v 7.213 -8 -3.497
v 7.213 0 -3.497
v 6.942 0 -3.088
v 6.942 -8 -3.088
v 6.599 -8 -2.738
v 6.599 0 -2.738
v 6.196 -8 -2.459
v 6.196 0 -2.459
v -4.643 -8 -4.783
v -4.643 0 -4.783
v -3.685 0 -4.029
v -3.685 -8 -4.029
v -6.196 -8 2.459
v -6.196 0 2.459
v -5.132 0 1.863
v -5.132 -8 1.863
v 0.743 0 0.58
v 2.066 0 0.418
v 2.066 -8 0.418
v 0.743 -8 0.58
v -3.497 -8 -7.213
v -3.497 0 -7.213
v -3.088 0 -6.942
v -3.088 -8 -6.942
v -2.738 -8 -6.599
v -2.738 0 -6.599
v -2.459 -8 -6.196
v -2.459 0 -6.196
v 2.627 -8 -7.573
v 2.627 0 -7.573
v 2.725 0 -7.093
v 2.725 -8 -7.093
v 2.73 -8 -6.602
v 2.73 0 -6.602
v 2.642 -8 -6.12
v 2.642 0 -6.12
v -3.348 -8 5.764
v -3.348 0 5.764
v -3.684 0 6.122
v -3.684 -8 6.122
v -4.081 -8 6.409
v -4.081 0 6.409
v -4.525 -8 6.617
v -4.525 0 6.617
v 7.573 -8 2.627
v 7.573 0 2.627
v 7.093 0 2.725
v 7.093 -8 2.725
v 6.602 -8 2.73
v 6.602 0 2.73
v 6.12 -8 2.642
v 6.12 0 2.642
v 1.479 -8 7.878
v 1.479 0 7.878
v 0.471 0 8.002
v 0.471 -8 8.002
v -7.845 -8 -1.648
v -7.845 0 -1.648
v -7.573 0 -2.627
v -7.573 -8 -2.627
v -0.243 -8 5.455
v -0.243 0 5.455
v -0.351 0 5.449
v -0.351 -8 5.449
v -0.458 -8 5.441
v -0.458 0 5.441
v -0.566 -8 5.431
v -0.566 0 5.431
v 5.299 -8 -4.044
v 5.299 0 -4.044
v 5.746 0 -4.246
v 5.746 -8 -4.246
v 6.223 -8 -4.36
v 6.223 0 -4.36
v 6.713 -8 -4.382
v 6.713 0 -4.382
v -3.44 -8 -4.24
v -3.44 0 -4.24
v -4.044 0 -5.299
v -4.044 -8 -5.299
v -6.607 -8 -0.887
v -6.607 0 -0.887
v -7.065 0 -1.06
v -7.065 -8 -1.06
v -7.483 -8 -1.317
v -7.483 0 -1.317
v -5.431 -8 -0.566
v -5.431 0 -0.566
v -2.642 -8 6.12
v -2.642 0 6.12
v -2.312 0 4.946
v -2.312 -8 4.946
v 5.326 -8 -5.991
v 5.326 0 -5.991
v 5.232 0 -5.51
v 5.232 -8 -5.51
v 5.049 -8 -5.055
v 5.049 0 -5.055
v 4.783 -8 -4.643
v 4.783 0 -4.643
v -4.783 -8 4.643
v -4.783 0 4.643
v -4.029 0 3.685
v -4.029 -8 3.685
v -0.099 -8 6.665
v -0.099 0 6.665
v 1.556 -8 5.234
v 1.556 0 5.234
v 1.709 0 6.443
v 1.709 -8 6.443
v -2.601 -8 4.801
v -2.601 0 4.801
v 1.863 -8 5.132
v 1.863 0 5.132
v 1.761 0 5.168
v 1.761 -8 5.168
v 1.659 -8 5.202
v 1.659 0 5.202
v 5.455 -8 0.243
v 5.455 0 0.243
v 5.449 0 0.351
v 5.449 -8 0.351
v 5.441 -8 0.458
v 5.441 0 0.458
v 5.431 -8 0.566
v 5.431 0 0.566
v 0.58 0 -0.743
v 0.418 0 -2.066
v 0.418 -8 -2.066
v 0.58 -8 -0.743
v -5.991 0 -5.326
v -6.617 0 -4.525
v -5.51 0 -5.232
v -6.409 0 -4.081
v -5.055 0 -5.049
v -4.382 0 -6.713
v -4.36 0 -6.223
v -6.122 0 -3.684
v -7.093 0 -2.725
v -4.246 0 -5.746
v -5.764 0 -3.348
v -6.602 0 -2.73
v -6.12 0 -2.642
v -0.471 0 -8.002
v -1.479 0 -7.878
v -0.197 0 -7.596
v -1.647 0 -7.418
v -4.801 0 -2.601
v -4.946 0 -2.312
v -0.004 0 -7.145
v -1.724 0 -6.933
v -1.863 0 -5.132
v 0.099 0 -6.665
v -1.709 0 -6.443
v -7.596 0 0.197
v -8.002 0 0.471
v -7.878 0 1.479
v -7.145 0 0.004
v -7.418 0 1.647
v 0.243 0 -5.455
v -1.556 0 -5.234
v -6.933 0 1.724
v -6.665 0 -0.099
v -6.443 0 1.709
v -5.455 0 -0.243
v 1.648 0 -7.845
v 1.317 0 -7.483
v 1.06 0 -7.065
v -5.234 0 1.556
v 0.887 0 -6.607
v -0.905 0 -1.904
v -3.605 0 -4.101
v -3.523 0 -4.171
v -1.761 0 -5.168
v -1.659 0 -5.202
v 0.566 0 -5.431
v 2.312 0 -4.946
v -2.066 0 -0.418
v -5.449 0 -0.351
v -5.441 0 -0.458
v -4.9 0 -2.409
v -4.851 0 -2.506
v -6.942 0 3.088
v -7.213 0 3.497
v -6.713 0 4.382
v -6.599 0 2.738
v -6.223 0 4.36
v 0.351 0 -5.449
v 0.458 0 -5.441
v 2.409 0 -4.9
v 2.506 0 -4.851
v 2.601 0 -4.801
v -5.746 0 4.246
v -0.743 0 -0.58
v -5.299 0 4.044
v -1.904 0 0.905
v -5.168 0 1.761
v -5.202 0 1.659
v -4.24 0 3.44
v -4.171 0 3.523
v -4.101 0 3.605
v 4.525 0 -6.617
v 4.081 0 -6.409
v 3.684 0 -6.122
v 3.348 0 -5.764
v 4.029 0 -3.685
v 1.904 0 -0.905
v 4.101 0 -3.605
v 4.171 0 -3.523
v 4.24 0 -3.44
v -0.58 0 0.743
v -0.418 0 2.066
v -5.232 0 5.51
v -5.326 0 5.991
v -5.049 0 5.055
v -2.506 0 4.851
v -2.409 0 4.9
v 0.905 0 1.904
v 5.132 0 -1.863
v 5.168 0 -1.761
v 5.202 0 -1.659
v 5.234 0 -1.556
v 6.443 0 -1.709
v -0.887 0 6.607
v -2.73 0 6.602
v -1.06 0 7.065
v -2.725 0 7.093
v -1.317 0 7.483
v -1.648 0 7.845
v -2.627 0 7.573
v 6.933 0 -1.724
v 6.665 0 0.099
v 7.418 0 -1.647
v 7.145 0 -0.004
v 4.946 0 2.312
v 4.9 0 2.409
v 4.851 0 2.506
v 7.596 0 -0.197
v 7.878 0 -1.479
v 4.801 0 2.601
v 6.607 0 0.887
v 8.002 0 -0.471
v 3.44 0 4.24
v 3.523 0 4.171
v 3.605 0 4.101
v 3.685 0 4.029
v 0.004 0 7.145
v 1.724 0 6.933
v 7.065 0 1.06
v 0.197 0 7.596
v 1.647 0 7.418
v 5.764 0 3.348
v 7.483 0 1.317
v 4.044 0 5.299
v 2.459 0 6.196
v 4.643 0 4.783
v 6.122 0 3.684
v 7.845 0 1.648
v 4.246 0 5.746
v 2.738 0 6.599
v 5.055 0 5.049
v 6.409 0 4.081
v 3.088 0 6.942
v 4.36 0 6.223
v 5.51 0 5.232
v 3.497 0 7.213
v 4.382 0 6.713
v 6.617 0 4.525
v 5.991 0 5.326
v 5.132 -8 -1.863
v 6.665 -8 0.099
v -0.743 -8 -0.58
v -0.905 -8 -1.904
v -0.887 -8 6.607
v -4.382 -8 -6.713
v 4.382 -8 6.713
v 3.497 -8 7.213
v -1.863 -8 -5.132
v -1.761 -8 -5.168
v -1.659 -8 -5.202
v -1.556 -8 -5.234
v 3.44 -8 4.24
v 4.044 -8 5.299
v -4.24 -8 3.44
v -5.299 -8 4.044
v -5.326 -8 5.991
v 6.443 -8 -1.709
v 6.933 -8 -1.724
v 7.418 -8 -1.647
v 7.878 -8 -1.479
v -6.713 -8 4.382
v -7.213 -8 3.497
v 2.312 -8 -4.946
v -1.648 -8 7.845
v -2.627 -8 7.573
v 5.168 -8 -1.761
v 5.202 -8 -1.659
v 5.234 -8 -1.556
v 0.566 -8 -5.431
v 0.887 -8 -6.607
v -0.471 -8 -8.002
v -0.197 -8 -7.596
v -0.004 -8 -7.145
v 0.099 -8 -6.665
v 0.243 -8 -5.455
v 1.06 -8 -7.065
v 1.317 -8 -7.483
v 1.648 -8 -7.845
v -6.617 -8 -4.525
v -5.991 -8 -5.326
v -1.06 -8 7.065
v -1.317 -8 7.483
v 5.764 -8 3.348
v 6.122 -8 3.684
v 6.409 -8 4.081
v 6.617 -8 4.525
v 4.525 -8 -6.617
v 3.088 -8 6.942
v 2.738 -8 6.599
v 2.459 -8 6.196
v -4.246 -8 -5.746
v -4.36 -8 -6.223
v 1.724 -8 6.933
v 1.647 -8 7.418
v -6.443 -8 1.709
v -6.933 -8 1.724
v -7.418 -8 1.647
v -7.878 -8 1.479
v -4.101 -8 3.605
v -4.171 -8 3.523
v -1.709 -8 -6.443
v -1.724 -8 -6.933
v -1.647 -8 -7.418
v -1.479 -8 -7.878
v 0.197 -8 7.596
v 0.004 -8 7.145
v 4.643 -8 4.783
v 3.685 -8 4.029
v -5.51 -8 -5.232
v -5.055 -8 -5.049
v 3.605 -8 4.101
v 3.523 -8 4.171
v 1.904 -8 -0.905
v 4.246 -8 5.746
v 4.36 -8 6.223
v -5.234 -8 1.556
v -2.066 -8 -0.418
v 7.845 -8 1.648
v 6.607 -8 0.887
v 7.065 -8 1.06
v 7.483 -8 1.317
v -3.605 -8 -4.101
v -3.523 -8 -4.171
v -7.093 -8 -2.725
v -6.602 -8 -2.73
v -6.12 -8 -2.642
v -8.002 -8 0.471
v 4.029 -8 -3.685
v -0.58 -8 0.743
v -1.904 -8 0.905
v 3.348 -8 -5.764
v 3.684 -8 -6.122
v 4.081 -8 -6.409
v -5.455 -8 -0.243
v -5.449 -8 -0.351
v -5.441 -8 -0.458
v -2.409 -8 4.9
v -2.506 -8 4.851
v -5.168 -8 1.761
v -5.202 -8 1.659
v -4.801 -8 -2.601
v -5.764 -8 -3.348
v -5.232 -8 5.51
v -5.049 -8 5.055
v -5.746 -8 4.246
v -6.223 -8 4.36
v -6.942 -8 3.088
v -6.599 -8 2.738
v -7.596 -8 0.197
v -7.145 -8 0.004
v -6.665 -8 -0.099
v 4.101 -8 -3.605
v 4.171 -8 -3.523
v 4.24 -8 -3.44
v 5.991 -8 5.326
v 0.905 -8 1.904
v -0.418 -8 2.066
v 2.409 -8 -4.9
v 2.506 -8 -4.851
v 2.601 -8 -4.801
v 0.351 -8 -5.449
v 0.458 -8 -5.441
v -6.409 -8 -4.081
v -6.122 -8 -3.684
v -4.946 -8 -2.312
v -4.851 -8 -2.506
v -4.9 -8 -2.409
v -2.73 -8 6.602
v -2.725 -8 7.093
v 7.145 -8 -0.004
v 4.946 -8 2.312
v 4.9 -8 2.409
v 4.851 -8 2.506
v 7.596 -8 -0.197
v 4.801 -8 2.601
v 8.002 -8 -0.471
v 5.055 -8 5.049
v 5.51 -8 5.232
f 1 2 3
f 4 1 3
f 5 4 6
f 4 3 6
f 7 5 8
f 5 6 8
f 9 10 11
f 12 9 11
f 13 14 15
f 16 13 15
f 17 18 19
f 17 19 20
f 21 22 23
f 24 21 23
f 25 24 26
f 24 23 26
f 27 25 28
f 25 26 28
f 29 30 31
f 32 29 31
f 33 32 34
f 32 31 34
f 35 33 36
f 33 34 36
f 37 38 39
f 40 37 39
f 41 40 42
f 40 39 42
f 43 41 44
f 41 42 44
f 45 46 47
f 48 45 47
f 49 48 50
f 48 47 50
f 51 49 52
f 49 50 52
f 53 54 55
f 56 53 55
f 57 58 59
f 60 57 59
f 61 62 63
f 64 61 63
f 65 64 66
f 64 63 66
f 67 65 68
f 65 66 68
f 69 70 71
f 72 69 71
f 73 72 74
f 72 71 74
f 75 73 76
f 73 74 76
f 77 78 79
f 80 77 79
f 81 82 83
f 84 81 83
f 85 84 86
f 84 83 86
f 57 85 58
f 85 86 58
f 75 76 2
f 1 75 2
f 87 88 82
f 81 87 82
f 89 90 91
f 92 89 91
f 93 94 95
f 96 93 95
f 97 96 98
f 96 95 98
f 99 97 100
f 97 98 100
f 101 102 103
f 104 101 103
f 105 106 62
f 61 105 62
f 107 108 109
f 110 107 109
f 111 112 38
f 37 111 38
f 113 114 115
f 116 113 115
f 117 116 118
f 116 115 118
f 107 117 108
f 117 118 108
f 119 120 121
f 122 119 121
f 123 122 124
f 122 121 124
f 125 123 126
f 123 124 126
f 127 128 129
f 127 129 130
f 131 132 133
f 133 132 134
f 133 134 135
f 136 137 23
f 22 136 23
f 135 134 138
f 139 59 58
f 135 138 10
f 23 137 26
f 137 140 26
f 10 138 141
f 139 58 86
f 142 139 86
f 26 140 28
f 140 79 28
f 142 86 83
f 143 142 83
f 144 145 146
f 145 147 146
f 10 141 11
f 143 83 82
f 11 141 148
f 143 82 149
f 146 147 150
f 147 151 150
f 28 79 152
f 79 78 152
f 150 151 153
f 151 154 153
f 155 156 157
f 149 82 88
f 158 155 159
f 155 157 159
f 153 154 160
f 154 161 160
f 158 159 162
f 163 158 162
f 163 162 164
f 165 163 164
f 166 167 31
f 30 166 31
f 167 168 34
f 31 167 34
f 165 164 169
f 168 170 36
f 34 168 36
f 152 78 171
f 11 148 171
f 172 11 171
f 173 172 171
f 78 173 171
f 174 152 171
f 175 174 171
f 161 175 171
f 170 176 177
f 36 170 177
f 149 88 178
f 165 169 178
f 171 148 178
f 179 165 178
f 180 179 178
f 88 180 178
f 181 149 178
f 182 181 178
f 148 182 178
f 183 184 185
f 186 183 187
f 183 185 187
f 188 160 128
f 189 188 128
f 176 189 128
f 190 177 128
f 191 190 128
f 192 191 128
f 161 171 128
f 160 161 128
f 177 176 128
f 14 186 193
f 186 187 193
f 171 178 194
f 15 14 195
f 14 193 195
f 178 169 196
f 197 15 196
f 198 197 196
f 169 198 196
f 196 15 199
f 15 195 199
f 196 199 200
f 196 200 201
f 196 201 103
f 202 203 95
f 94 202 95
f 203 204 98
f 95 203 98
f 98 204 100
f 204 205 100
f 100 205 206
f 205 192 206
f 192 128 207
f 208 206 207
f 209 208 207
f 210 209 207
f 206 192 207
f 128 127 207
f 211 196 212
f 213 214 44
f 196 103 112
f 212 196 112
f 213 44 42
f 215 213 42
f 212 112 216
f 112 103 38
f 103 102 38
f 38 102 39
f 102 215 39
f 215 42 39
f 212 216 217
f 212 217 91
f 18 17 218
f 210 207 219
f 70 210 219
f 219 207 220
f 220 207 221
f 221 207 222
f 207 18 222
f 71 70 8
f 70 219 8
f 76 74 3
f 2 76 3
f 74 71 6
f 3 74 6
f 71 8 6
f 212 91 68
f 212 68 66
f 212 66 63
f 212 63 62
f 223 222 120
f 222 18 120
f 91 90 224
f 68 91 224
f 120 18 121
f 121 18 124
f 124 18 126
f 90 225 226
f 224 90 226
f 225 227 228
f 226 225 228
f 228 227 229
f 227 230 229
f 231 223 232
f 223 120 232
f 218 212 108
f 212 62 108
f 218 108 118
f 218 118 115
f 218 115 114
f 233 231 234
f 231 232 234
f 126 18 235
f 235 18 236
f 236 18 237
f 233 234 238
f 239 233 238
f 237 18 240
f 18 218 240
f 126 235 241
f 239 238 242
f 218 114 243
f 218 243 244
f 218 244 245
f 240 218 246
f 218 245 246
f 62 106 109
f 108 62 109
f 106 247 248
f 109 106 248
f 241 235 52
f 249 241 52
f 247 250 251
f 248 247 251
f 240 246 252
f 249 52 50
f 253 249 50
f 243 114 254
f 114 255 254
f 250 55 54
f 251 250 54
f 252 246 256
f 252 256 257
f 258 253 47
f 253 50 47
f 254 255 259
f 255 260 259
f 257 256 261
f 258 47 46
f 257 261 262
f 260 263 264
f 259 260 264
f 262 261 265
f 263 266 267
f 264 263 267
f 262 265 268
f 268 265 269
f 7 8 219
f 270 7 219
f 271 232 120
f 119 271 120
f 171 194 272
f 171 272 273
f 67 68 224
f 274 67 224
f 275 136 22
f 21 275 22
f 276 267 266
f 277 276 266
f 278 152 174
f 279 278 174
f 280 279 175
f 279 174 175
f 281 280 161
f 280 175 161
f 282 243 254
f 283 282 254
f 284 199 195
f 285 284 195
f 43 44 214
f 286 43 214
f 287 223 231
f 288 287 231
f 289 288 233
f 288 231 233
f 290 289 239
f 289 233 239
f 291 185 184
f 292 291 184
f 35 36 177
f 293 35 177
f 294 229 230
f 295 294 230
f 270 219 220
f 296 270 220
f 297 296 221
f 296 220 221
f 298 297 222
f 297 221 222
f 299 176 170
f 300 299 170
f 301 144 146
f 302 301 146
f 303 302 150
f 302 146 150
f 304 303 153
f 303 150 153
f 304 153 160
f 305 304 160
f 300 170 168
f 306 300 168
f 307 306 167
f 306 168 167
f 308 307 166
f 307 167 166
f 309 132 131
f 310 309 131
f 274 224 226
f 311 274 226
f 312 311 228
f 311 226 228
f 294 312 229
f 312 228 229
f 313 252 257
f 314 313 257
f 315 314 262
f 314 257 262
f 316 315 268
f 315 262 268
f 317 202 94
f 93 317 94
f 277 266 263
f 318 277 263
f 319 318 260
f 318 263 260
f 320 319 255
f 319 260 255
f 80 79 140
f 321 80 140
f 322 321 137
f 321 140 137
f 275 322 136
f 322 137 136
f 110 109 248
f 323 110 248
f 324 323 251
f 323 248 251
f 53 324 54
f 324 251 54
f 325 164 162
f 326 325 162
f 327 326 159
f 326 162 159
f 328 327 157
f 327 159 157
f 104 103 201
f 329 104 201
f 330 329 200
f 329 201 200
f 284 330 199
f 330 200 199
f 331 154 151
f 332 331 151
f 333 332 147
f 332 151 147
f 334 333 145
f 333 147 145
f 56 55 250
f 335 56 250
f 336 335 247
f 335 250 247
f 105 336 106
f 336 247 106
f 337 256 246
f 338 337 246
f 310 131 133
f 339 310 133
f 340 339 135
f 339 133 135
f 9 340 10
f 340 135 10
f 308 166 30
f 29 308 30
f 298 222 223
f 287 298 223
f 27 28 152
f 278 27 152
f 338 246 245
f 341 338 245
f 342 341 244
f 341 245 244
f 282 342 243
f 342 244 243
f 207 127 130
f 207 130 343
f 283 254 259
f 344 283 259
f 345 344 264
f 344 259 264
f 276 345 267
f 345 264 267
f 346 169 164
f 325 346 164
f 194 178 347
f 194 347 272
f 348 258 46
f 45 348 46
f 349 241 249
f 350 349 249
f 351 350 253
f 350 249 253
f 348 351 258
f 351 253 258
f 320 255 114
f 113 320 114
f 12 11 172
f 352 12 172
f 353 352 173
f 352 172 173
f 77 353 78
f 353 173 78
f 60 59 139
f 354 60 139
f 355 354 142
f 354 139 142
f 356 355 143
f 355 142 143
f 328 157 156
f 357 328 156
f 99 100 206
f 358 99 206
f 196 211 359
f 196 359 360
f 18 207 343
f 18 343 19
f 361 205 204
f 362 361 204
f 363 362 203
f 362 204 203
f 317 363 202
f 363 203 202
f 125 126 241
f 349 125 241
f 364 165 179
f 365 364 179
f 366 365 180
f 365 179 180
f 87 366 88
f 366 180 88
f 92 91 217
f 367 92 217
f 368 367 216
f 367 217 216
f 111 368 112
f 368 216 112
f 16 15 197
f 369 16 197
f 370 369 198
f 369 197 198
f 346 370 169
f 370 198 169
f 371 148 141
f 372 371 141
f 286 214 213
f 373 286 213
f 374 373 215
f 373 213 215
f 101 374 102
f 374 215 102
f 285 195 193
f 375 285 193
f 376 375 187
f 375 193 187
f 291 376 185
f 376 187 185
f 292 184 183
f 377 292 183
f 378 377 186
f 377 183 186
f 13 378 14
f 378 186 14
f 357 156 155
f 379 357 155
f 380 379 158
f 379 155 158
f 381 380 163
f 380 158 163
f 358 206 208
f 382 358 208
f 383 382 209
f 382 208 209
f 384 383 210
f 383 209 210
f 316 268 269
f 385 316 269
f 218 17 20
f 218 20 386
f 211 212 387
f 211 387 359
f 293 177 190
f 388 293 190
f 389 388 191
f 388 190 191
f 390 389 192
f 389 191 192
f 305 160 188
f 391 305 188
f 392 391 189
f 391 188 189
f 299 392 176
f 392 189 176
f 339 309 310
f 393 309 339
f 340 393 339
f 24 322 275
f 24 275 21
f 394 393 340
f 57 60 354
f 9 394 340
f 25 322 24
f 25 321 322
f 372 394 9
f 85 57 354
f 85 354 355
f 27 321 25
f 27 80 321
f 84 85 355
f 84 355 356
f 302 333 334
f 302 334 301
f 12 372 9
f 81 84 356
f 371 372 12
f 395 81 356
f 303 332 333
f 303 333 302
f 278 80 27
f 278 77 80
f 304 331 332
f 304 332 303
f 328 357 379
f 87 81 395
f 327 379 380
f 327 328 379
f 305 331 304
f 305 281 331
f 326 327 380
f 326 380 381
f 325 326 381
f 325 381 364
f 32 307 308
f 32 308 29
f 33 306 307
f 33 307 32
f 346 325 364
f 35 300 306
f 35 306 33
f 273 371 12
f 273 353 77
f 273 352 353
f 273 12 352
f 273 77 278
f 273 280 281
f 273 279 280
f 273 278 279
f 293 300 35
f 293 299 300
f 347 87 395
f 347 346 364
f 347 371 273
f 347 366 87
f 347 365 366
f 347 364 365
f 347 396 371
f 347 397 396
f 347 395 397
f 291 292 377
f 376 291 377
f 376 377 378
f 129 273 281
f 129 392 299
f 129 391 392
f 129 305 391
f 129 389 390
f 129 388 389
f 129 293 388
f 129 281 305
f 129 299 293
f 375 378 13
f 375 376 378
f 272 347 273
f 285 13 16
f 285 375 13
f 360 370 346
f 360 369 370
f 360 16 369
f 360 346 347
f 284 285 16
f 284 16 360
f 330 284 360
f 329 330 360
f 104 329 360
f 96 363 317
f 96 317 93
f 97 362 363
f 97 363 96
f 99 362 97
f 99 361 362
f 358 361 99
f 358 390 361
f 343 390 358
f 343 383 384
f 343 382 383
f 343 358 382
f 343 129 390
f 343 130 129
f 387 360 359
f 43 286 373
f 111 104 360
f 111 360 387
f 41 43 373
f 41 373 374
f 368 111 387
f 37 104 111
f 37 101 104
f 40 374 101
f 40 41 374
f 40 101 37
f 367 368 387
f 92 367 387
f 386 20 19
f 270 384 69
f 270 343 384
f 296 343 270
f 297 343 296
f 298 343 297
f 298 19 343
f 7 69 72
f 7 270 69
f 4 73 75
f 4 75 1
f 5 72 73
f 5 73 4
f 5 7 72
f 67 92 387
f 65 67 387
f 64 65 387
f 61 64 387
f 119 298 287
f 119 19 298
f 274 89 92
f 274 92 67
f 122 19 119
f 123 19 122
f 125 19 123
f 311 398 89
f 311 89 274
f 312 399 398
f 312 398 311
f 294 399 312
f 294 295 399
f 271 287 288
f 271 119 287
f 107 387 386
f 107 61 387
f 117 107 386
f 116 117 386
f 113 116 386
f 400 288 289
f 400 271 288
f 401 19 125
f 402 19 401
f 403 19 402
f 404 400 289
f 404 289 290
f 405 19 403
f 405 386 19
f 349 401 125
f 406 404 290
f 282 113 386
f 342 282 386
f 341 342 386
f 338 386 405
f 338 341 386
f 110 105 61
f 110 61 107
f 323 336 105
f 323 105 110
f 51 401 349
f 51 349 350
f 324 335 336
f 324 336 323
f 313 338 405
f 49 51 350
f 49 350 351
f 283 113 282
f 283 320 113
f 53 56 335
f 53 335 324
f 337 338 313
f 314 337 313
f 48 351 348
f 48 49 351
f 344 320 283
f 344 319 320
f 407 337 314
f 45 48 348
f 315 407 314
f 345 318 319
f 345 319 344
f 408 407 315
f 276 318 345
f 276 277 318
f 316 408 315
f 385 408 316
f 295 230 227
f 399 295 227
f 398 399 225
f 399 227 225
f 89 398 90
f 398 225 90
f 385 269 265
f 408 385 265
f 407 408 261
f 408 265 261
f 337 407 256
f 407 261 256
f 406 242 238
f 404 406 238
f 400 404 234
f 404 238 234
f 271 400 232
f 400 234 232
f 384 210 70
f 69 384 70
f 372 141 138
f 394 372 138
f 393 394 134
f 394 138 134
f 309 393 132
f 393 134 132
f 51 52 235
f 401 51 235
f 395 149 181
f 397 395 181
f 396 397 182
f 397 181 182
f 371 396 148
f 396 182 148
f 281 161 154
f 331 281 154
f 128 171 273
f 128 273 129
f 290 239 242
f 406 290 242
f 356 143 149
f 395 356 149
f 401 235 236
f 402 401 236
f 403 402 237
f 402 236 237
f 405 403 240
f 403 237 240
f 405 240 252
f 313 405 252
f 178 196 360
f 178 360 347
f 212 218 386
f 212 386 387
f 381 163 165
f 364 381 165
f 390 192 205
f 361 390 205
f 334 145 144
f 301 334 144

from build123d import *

# Parameters (mm, degrees)
F2_R            = 5.46
F3_DEPTH        = 8
F4_DEPTH        = 8
F4_COPIES_COUNT = 16
F6_DEPTH        = 25.4


# Not quite as in the source:
# - a pattern or mirror of a feature is missing from the dataset's text; its kind, count and spacing are read off the source's solid


with BuildPart() as f3:
    # F2 (on Front) → F3 (new body)
    with BuildSketch(Plane.XZ):
        Circle(F2_R)
    extrude(amount=F3_DEPTH)

    # F0 (on Front) → F4 (join, through all)
    with BuildSketch(Plane.XZ):
        with BuildLine():
            Line((1.4791617247, 7.8784603808), (0.4707348346, 8.0022796337))
            ThreePointArc((0.4707348346, 8.0022796337), (0.0898874426, 7.3746171039), (-0.099337312, 6.6652519091))
            Line((-0.099337312, 6.6652519091), (-0.2432709729, 5.4545778236))
            ThreePointArc((-0.2432709729, 5.4545778236), (0.6654030831, 5.4193024216), (1.5556197703, 5.2337030036))
            Line((1.5556197703, 5.2337030036), (1.7088476245, 6.4432359154))
            ThreePointArc((1.7088476245, 6.4432359154), (1.6968529376, 7.1773074522), (1.4791617247, 7.8784603808))
        make_face()
    f4 = extrude(amount=F4_DEPTH)

    # F4_copies: F4 ×16 about axis
    f4_copies_axis = Axis((0, 0, 0), (0, 1, 0))
    for i in range(1, F4_COPIES_COUNT):
        add(f4.rotate(f4_copies_axis, i * 360 / F4_COPIES_COUNT))

    # F5 (on Front) → F6 (cut)
    with BuildSketch(Plane.XZ):
        Polygon((0.7429432851, 0.5804516897), (0.9054348805, 1.9038466644), (0.2437373931, 1.9850924621), (-0.4179600943, 2.0663382598), (-0.5804516897, 0.7429432851), (-1.9038466644, 0.9054348805), (-1.9850924621, 0.2437373931), (-2.0663382598, -0.4179600943), (-0.7429432851, -0.5804516897), (-0.9054348805, -1.9038466644), (-0.2437373931, -1.9850924621), (0.4179600943, -2.0663382598), (0.5804516897, -0.7429432851), (1.9038466644, -0.9054348805), (1.9850924621, -0.2437373931), (2.0663382598, 0.4179600943), align=None)
    extrude(amount=F6_DEPTH, mode=Mode.SUBTRACT)


solid = f3.part
